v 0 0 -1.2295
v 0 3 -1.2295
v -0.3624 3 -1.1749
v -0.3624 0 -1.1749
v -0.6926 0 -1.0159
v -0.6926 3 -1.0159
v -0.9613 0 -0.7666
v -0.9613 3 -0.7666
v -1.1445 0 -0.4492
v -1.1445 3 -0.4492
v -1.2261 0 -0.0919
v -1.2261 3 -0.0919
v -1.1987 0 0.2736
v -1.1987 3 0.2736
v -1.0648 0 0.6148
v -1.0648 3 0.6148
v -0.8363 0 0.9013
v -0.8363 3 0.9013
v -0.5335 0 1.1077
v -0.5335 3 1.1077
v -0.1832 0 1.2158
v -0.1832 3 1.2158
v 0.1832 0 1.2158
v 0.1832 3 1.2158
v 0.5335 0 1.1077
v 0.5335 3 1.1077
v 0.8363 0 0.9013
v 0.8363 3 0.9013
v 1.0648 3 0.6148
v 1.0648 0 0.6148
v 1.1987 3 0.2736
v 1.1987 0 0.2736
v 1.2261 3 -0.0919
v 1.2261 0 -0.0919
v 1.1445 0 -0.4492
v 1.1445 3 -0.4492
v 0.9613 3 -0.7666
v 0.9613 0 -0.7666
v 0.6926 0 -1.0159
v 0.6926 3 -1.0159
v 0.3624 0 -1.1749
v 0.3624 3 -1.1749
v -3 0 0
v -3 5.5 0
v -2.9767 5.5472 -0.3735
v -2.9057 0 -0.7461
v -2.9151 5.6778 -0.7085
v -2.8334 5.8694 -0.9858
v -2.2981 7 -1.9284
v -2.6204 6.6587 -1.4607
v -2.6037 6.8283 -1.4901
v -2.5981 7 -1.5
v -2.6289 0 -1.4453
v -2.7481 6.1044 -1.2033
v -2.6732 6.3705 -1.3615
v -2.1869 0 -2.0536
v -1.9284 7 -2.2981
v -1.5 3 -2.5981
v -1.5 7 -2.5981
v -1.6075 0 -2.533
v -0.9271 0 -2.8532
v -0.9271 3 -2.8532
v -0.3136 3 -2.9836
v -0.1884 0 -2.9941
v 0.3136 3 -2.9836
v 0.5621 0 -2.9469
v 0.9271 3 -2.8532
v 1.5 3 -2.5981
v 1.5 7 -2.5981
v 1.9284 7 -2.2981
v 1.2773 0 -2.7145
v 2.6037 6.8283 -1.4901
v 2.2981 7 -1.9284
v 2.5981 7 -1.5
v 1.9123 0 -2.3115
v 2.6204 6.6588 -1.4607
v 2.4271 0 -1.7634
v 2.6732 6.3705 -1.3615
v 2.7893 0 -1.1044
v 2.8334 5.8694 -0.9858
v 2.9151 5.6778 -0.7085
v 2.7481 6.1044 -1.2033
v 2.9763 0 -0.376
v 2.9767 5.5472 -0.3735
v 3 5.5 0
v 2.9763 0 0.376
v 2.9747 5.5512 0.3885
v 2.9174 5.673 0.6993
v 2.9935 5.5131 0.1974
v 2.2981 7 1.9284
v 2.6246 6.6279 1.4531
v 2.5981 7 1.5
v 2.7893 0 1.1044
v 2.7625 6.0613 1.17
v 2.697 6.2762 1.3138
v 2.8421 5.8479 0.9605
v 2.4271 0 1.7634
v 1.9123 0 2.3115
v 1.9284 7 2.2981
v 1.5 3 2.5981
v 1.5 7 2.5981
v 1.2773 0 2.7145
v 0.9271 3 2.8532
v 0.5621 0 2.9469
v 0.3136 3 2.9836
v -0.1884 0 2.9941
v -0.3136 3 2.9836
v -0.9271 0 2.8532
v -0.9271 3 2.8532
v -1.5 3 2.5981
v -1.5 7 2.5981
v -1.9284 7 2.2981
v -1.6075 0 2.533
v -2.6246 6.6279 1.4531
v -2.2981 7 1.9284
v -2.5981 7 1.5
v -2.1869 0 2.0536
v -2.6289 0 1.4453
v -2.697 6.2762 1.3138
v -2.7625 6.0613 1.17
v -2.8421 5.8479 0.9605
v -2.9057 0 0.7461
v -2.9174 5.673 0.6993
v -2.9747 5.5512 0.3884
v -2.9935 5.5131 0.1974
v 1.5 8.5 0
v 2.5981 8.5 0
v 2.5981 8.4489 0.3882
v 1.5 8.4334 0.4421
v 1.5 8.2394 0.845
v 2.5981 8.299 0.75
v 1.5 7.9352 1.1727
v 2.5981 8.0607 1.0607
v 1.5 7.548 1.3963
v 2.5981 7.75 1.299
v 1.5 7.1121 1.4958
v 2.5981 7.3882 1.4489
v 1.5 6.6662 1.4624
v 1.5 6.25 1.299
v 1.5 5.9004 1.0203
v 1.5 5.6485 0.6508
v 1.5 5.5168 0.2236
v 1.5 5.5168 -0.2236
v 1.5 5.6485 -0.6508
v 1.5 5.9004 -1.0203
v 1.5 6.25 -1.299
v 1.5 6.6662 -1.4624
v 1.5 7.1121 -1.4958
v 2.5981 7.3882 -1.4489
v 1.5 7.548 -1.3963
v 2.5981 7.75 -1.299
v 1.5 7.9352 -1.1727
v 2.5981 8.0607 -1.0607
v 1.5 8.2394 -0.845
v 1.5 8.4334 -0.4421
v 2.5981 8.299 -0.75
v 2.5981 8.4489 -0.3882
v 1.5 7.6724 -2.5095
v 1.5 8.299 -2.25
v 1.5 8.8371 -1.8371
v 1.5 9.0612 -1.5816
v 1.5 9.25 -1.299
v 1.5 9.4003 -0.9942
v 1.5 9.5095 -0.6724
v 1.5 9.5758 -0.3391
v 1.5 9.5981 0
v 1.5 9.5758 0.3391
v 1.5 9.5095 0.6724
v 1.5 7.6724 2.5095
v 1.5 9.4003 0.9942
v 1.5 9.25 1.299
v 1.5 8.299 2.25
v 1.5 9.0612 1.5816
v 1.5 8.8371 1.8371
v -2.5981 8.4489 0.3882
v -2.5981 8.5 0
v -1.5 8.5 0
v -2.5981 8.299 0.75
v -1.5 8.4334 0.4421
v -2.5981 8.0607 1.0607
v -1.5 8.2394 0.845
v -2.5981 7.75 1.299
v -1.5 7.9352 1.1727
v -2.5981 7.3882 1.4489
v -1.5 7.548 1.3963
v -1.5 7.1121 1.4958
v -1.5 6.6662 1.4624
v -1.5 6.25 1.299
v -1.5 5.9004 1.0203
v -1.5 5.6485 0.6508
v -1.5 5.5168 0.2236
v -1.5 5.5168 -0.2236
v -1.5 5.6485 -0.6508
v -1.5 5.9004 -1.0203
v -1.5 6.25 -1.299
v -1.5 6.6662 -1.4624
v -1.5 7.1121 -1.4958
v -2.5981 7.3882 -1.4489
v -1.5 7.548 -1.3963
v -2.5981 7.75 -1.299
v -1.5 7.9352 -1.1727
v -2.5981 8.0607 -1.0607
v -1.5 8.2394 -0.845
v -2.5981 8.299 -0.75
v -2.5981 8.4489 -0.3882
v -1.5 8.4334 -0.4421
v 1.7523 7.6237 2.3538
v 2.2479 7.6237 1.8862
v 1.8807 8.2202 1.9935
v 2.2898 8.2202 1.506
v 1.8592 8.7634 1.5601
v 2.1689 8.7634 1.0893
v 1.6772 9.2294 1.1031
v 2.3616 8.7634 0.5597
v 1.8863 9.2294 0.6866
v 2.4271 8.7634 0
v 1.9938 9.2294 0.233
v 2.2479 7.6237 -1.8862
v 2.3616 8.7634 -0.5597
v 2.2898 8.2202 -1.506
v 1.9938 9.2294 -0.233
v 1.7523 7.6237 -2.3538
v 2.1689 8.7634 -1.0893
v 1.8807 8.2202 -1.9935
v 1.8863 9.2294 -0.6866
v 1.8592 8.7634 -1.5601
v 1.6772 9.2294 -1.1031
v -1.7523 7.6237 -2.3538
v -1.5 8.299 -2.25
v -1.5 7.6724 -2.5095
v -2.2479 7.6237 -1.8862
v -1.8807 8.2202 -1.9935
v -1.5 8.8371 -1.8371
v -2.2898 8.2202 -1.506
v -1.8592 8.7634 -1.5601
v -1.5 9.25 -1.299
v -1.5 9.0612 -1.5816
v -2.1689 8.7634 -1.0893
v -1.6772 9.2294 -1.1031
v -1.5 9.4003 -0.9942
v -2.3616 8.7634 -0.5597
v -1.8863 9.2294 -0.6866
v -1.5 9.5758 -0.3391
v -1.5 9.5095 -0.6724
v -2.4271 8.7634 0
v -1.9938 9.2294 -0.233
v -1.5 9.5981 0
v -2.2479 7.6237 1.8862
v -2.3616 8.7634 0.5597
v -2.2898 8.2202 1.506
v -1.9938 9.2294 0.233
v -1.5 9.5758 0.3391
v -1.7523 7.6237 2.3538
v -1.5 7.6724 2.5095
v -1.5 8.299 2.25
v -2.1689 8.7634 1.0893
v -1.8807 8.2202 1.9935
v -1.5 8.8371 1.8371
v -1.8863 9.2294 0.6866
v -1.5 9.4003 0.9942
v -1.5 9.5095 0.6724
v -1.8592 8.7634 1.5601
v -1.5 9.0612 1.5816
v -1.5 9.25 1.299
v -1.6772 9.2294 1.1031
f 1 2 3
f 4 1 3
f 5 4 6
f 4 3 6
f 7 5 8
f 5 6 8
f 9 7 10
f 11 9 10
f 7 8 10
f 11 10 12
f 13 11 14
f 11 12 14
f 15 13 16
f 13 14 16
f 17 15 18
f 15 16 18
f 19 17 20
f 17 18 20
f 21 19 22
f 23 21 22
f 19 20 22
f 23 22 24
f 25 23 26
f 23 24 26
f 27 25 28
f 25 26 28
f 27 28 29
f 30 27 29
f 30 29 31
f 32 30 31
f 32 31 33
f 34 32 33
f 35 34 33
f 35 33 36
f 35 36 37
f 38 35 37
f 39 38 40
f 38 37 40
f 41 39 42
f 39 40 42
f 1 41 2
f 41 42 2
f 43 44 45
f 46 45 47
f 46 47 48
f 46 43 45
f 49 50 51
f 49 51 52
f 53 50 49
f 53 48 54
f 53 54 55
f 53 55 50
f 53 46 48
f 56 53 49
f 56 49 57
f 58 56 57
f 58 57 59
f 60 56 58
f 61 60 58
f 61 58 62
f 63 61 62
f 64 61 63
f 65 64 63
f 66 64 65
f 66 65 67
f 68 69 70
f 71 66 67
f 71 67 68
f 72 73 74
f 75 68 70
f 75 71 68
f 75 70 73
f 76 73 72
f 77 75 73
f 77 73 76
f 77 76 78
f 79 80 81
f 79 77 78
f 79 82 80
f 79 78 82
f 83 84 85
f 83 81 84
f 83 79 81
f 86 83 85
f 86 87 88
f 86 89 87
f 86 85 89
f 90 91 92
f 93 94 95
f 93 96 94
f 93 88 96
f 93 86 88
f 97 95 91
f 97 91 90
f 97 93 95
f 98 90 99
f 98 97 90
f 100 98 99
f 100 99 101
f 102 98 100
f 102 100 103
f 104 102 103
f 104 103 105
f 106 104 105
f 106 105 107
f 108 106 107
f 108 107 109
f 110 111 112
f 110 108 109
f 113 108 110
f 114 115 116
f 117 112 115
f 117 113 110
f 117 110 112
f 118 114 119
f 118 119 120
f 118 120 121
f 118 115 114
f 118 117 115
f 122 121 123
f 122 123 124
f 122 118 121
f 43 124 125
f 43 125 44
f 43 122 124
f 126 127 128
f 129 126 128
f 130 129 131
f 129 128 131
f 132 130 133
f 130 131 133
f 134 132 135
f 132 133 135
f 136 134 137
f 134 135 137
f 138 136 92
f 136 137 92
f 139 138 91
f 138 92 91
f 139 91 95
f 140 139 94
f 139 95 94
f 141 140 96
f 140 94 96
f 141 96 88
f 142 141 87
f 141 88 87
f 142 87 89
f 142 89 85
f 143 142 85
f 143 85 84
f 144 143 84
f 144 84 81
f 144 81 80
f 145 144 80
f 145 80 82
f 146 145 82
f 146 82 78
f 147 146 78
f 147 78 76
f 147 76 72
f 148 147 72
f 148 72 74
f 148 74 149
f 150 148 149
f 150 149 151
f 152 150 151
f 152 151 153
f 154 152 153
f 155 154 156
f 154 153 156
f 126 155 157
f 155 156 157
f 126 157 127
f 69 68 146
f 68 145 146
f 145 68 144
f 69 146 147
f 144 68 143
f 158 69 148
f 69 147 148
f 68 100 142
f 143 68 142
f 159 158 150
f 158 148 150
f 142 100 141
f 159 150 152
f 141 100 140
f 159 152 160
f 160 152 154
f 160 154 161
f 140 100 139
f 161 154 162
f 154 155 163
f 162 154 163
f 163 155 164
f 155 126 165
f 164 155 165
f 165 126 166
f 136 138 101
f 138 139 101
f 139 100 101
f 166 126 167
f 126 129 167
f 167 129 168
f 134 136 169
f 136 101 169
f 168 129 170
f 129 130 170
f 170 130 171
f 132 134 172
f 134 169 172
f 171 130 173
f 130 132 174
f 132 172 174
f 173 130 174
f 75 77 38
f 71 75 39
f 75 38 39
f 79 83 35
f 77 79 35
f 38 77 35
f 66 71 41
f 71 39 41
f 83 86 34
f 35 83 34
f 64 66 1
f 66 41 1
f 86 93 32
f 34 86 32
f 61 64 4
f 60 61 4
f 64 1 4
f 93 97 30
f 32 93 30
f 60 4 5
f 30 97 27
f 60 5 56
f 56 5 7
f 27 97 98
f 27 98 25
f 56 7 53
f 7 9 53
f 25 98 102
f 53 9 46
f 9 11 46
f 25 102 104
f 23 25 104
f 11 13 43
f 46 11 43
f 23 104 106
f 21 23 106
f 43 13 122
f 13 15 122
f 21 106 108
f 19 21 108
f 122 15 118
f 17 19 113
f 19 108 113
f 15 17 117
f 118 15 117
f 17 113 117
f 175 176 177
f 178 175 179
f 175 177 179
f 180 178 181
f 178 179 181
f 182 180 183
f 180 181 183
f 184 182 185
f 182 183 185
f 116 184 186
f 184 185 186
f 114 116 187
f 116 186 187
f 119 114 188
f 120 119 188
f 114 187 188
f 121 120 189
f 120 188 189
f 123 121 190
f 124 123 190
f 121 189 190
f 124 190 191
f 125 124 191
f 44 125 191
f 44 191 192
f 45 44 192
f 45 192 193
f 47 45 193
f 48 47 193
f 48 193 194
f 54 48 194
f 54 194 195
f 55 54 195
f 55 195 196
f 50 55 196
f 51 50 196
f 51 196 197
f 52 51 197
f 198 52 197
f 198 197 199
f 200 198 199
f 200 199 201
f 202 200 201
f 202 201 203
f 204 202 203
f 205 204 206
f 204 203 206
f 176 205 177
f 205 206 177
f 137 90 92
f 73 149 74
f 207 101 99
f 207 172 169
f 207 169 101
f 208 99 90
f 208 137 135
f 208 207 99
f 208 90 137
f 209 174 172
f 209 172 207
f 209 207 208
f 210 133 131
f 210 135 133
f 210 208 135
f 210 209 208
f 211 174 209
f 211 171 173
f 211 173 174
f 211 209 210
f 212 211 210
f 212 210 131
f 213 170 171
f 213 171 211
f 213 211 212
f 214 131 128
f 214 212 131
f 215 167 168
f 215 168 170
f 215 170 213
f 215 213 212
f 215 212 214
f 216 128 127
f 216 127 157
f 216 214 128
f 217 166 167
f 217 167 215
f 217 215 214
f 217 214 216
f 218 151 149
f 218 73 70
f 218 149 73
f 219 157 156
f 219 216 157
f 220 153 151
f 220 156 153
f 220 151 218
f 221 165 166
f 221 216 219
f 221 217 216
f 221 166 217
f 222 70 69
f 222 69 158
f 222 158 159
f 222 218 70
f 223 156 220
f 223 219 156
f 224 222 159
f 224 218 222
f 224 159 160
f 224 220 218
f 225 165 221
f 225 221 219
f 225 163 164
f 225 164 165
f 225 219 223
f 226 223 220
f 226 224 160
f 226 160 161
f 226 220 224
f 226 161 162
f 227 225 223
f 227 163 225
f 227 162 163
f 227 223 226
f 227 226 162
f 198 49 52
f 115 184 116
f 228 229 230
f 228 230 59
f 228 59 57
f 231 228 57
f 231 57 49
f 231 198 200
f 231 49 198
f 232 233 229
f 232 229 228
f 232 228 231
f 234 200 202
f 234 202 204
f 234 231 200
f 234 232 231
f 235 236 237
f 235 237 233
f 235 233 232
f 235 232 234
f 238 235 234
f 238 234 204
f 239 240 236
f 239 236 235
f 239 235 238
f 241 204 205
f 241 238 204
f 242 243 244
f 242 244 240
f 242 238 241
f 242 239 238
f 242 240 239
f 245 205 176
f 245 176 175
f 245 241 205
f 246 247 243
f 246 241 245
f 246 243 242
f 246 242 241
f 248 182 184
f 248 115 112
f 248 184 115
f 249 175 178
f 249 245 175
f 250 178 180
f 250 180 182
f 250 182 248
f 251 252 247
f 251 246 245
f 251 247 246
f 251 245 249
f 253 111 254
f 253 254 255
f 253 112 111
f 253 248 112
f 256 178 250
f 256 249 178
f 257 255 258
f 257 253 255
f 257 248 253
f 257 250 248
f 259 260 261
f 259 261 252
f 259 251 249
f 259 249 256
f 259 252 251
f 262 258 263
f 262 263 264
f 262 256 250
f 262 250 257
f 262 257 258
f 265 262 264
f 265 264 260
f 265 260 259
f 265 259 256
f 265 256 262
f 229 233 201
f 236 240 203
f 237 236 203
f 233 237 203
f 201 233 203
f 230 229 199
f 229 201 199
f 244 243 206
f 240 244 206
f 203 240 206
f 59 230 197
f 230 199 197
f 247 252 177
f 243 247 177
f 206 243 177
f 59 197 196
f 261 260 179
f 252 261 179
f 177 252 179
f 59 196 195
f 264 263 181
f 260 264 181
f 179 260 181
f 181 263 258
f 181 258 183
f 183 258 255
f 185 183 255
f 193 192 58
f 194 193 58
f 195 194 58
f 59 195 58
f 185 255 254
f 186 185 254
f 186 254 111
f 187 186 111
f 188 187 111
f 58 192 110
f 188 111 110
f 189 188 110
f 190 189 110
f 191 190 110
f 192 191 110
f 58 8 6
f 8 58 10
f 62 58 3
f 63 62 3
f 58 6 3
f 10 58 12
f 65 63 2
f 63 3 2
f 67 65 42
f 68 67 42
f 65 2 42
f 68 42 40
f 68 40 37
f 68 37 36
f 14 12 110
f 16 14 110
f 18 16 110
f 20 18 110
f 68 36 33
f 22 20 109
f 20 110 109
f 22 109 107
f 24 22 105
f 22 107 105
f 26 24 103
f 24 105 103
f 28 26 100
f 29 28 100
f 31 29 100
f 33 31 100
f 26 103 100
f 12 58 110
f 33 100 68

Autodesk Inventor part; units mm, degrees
ref_plane "XZ Plane" through (0, 0, 0) normal (0, 1, 0) x (-1, 0, 0)
sketch "Sketch1" plane through (0, 0, 0) normal (0, 1, 0) x (-1, 0, 0)
  circle A0 centre (0, 0) radius 3
  dimension "d0" = 6
extrude "Extrusion1" add sketch "Sketch1" along normal blind 10
fillet "Fillet1" radius 3 1 edges at (3, 10, 0)
ref_plane "Work Plane2" through (0, 0, 3) normal (0, 0, 1) x (1, 0, 0)
ref_plane "Work Plane3" through (3, 0, 0) normal (1, 0, 0) x (0, 1, 0)
sketch "Sketch6" plane through (3, 0, 0) normal (1, 0, 0) x (0, 1, 0)
  circle A0 centre (7, 0) radius 1.5
  arc A1 (7, -3) -> (7, 3) centre (7, 0) ccw projected
  point P0 (0, 0)
  dimension "d21" = 3
extrude "Extrusion4" cut sketch "Sketch6" against normal blind 6
sketch "Sketch5" plane through (0, 0, 3) normal (0, 0, 1) x (1, 0, 0)
  line L0 (3, 0) -> (-3, 0) projected
  line L1 (-1.5, 9.5981) -> (-1.5, 3)
  line L2 (-1.5, 3) -> (1.5, 3)
  line L3 (1.5, 3) -> (1.5, 9.5981)
  arc A0 (2.5981, 8.5) -> (-2.5981, 8.5) centre (0, 7) ccw projected
  line L4 (0, 3) -> (0, 10) construction
  line L5 (2.5981, 7) -> (-2.5981, 7) projected
  arc A1 (1.4921, 9.6026) -> (-1.5, 9.5981) centre (0, 7) ccw
  point P0 (0, 0)
  point P1 (3, 10)
  point P2 (-3, 10)
  point P3 (0, 9.7895)
  point P4 (0, 10)
  point P5 (0, 0)
  dimension "d16" = 3
  dimension "d25" = 7
  dimension "d26" = 1.5
extrude "Extrusion3" cut sketch "Sketch5" against normal blind 6
sketch "Sketch7" plane through (0, 0, 0) normal (0, -1, 0) x (1, 0, 0)
  circle A0 centre (0, 0) radius 3 projected
hole "Hole2" at (0, 0, 0) direction (0, 1, 0) diameter 2.459 depth 3 thread size "M3x0.5" class "6H" standard "ISO Metric profile"
properties part number "19.1"
